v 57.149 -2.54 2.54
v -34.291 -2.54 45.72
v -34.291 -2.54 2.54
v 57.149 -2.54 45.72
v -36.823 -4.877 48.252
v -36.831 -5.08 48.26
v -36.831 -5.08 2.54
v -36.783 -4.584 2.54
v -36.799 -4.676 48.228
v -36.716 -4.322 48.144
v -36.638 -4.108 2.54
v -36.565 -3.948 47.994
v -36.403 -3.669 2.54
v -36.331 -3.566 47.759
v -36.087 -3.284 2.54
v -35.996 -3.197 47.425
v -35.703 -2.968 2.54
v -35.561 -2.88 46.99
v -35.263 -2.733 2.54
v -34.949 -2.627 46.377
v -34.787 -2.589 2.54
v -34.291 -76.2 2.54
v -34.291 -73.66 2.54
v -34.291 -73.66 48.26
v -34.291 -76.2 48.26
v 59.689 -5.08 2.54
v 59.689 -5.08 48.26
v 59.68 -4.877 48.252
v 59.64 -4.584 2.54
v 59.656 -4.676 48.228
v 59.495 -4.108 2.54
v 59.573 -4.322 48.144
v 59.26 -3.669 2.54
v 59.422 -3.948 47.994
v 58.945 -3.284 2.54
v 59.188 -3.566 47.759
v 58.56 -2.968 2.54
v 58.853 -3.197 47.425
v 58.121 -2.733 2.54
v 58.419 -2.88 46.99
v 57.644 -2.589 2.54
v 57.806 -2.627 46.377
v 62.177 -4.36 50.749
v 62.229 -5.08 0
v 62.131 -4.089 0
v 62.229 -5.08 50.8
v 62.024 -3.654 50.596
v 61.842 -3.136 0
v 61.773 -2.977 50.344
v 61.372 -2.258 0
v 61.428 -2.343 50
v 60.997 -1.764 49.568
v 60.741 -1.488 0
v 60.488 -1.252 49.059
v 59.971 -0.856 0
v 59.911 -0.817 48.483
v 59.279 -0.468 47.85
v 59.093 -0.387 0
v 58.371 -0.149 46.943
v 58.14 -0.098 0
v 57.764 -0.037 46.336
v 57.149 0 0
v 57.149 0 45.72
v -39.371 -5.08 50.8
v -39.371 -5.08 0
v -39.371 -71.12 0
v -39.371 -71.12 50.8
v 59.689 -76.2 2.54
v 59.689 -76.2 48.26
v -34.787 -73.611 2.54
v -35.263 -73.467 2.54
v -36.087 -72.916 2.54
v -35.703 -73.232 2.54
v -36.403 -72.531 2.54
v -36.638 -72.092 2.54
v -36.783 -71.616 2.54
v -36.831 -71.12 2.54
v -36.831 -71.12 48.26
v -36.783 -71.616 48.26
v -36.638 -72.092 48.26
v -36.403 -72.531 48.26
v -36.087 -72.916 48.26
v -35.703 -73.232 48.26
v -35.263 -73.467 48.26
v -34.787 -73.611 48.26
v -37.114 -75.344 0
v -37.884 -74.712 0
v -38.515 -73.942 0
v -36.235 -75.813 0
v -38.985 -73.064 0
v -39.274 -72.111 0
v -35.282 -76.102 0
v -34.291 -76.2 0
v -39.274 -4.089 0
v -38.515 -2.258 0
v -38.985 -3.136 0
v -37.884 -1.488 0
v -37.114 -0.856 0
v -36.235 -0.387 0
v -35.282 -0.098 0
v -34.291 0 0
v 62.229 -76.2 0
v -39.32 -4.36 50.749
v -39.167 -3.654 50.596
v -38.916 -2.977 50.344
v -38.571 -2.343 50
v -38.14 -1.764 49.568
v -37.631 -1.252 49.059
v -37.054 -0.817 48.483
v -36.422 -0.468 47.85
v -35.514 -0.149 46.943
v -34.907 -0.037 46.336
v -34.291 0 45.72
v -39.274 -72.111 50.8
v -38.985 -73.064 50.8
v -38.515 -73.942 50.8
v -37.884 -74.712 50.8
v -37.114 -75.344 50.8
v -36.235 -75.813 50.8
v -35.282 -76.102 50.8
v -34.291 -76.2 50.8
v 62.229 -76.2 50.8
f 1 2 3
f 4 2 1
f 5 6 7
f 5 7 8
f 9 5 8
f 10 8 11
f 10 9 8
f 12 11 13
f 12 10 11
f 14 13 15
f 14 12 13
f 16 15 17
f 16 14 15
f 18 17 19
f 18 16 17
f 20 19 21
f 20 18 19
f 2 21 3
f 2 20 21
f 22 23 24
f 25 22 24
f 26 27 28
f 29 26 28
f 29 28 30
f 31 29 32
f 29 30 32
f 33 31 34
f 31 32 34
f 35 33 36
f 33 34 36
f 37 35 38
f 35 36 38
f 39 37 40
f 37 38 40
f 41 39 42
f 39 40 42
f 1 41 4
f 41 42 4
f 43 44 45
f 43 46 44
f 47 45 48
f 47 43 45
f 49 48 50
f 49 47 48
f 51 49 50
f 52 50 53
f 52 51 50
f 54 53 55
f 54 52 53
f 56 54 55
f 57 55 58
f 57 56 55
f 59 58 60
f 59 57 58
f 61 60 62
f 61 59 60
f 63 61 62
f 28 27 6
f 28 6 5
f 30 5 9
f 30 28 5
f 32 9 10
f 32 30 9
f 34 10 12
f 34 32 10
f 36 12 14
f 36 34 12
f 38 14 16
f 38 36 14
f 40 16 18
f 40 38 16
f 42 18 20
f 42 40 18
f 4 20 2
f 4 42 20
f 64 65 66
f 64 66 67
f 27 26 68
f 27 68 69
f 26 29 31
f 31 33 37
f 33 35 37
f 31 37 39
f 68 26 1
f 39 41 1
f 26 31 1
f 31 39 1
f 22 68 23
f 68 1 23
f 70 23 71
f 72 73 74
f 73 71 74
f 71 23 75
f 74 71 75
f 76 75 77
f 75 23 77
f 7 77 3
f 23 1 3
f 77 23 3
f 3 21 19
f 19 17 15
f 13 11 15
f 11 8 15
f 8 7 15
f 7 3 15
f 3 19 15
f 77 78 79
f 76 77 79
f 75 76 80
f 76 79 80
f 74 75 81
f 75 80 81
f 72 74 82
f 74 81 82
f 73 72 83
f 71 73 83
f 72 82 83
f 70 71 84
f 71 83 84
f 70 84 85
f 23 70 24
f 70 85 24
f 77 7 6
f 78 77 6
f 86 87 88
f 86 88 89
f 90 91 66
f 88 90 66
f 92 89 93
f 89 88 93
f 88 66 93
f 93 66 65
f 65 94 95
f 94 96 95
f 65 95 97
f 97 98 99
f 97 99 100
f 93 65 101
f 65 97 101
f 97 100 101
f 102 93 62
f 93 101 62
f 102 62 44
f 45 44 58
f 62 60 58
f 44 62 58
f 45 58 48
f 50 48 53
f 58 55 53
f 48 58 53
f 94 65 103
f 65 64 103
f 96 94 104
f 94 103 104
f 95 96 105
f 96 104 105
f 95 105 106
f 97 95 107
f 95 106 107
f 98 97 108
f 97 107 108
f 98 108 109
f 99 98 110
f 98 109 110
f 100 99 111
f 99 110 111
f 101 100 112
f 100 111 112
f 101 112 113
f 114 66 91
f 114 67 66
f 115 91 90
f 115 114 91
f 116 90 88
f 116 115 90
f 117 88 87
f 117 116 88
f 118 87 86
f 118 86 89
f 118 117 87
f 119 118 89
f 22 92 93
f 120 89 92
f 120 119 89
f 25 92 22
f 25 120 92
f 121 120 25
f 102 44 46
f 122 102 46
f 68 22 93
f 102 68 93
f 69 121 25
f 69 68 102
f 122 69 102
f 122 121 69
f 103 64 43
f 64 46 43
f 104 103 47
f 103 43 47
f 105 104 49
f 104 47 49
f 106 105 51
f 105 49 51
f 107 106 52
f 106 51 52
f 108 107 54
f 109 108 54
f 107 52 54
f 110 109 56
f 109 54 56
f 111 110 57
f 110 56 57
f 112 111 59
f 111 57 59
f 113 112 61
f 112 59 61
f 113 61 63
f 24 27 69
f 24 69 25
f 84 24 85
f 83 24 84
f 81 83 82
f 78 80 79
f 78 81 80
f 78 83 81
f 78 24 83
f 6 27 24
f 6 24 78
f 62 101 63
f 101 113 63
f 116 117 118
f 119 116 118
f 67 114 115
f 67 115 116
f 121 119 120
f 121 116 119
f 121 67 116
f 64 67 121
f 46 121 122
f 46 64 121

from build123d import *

# Parameters (mm, degrees)
F0_W     = 101.6
F0_H     = 50.8
F1_DEPTH = 76.2
F2_R     = 5.08
F3_T     = -2.54


# Not quite as in the source:
# - a shell that OpenCascade refuses in one call is made with other operations: the cavity is built on its own and cut out


with BuildPart() as f1:
    # F0 (on Front) → F1 (new body)
    with BuildSketch(Plane.XZ):
        with Locations((11.4285616755, 25.4)):
            Rectangle(F0_W, F0_H)
    extrude(amount=F1_DEPTH)

    # F2
    f2_edges = [f1.edges().sort_by_distance(p)[0] for p in [
        (-39.371438, -76.2, 25.4),
        (-39.371438, 0, 25.4),
        (11.428562, 0, 50.8),
        (62.228562, 0, 25.4),
    ]]
    fillet(f2_edges, radius=F2_R)

    # F3: a shell. OpenCascade refuses it in one call, so the cavity is built on its own and cut out:
    # the body offset inwards by the wall thickness, plus a prism from it out through each open face.
    f3_core = offset(f1.part, amount=F3_T, mode=Mode.PRIVATE)
    f3_exits = [f3_core.faces().sort_by_distance(p)[0] for p in [
        (12.698562, -73.66, 25.4),
    ]]
    add(f3_core, mode=Mode.SUBTRACT)
    extrude(f3_exits, amount=-F3_T, mode=Mode.SUBTRACT)


solid = f1.part
